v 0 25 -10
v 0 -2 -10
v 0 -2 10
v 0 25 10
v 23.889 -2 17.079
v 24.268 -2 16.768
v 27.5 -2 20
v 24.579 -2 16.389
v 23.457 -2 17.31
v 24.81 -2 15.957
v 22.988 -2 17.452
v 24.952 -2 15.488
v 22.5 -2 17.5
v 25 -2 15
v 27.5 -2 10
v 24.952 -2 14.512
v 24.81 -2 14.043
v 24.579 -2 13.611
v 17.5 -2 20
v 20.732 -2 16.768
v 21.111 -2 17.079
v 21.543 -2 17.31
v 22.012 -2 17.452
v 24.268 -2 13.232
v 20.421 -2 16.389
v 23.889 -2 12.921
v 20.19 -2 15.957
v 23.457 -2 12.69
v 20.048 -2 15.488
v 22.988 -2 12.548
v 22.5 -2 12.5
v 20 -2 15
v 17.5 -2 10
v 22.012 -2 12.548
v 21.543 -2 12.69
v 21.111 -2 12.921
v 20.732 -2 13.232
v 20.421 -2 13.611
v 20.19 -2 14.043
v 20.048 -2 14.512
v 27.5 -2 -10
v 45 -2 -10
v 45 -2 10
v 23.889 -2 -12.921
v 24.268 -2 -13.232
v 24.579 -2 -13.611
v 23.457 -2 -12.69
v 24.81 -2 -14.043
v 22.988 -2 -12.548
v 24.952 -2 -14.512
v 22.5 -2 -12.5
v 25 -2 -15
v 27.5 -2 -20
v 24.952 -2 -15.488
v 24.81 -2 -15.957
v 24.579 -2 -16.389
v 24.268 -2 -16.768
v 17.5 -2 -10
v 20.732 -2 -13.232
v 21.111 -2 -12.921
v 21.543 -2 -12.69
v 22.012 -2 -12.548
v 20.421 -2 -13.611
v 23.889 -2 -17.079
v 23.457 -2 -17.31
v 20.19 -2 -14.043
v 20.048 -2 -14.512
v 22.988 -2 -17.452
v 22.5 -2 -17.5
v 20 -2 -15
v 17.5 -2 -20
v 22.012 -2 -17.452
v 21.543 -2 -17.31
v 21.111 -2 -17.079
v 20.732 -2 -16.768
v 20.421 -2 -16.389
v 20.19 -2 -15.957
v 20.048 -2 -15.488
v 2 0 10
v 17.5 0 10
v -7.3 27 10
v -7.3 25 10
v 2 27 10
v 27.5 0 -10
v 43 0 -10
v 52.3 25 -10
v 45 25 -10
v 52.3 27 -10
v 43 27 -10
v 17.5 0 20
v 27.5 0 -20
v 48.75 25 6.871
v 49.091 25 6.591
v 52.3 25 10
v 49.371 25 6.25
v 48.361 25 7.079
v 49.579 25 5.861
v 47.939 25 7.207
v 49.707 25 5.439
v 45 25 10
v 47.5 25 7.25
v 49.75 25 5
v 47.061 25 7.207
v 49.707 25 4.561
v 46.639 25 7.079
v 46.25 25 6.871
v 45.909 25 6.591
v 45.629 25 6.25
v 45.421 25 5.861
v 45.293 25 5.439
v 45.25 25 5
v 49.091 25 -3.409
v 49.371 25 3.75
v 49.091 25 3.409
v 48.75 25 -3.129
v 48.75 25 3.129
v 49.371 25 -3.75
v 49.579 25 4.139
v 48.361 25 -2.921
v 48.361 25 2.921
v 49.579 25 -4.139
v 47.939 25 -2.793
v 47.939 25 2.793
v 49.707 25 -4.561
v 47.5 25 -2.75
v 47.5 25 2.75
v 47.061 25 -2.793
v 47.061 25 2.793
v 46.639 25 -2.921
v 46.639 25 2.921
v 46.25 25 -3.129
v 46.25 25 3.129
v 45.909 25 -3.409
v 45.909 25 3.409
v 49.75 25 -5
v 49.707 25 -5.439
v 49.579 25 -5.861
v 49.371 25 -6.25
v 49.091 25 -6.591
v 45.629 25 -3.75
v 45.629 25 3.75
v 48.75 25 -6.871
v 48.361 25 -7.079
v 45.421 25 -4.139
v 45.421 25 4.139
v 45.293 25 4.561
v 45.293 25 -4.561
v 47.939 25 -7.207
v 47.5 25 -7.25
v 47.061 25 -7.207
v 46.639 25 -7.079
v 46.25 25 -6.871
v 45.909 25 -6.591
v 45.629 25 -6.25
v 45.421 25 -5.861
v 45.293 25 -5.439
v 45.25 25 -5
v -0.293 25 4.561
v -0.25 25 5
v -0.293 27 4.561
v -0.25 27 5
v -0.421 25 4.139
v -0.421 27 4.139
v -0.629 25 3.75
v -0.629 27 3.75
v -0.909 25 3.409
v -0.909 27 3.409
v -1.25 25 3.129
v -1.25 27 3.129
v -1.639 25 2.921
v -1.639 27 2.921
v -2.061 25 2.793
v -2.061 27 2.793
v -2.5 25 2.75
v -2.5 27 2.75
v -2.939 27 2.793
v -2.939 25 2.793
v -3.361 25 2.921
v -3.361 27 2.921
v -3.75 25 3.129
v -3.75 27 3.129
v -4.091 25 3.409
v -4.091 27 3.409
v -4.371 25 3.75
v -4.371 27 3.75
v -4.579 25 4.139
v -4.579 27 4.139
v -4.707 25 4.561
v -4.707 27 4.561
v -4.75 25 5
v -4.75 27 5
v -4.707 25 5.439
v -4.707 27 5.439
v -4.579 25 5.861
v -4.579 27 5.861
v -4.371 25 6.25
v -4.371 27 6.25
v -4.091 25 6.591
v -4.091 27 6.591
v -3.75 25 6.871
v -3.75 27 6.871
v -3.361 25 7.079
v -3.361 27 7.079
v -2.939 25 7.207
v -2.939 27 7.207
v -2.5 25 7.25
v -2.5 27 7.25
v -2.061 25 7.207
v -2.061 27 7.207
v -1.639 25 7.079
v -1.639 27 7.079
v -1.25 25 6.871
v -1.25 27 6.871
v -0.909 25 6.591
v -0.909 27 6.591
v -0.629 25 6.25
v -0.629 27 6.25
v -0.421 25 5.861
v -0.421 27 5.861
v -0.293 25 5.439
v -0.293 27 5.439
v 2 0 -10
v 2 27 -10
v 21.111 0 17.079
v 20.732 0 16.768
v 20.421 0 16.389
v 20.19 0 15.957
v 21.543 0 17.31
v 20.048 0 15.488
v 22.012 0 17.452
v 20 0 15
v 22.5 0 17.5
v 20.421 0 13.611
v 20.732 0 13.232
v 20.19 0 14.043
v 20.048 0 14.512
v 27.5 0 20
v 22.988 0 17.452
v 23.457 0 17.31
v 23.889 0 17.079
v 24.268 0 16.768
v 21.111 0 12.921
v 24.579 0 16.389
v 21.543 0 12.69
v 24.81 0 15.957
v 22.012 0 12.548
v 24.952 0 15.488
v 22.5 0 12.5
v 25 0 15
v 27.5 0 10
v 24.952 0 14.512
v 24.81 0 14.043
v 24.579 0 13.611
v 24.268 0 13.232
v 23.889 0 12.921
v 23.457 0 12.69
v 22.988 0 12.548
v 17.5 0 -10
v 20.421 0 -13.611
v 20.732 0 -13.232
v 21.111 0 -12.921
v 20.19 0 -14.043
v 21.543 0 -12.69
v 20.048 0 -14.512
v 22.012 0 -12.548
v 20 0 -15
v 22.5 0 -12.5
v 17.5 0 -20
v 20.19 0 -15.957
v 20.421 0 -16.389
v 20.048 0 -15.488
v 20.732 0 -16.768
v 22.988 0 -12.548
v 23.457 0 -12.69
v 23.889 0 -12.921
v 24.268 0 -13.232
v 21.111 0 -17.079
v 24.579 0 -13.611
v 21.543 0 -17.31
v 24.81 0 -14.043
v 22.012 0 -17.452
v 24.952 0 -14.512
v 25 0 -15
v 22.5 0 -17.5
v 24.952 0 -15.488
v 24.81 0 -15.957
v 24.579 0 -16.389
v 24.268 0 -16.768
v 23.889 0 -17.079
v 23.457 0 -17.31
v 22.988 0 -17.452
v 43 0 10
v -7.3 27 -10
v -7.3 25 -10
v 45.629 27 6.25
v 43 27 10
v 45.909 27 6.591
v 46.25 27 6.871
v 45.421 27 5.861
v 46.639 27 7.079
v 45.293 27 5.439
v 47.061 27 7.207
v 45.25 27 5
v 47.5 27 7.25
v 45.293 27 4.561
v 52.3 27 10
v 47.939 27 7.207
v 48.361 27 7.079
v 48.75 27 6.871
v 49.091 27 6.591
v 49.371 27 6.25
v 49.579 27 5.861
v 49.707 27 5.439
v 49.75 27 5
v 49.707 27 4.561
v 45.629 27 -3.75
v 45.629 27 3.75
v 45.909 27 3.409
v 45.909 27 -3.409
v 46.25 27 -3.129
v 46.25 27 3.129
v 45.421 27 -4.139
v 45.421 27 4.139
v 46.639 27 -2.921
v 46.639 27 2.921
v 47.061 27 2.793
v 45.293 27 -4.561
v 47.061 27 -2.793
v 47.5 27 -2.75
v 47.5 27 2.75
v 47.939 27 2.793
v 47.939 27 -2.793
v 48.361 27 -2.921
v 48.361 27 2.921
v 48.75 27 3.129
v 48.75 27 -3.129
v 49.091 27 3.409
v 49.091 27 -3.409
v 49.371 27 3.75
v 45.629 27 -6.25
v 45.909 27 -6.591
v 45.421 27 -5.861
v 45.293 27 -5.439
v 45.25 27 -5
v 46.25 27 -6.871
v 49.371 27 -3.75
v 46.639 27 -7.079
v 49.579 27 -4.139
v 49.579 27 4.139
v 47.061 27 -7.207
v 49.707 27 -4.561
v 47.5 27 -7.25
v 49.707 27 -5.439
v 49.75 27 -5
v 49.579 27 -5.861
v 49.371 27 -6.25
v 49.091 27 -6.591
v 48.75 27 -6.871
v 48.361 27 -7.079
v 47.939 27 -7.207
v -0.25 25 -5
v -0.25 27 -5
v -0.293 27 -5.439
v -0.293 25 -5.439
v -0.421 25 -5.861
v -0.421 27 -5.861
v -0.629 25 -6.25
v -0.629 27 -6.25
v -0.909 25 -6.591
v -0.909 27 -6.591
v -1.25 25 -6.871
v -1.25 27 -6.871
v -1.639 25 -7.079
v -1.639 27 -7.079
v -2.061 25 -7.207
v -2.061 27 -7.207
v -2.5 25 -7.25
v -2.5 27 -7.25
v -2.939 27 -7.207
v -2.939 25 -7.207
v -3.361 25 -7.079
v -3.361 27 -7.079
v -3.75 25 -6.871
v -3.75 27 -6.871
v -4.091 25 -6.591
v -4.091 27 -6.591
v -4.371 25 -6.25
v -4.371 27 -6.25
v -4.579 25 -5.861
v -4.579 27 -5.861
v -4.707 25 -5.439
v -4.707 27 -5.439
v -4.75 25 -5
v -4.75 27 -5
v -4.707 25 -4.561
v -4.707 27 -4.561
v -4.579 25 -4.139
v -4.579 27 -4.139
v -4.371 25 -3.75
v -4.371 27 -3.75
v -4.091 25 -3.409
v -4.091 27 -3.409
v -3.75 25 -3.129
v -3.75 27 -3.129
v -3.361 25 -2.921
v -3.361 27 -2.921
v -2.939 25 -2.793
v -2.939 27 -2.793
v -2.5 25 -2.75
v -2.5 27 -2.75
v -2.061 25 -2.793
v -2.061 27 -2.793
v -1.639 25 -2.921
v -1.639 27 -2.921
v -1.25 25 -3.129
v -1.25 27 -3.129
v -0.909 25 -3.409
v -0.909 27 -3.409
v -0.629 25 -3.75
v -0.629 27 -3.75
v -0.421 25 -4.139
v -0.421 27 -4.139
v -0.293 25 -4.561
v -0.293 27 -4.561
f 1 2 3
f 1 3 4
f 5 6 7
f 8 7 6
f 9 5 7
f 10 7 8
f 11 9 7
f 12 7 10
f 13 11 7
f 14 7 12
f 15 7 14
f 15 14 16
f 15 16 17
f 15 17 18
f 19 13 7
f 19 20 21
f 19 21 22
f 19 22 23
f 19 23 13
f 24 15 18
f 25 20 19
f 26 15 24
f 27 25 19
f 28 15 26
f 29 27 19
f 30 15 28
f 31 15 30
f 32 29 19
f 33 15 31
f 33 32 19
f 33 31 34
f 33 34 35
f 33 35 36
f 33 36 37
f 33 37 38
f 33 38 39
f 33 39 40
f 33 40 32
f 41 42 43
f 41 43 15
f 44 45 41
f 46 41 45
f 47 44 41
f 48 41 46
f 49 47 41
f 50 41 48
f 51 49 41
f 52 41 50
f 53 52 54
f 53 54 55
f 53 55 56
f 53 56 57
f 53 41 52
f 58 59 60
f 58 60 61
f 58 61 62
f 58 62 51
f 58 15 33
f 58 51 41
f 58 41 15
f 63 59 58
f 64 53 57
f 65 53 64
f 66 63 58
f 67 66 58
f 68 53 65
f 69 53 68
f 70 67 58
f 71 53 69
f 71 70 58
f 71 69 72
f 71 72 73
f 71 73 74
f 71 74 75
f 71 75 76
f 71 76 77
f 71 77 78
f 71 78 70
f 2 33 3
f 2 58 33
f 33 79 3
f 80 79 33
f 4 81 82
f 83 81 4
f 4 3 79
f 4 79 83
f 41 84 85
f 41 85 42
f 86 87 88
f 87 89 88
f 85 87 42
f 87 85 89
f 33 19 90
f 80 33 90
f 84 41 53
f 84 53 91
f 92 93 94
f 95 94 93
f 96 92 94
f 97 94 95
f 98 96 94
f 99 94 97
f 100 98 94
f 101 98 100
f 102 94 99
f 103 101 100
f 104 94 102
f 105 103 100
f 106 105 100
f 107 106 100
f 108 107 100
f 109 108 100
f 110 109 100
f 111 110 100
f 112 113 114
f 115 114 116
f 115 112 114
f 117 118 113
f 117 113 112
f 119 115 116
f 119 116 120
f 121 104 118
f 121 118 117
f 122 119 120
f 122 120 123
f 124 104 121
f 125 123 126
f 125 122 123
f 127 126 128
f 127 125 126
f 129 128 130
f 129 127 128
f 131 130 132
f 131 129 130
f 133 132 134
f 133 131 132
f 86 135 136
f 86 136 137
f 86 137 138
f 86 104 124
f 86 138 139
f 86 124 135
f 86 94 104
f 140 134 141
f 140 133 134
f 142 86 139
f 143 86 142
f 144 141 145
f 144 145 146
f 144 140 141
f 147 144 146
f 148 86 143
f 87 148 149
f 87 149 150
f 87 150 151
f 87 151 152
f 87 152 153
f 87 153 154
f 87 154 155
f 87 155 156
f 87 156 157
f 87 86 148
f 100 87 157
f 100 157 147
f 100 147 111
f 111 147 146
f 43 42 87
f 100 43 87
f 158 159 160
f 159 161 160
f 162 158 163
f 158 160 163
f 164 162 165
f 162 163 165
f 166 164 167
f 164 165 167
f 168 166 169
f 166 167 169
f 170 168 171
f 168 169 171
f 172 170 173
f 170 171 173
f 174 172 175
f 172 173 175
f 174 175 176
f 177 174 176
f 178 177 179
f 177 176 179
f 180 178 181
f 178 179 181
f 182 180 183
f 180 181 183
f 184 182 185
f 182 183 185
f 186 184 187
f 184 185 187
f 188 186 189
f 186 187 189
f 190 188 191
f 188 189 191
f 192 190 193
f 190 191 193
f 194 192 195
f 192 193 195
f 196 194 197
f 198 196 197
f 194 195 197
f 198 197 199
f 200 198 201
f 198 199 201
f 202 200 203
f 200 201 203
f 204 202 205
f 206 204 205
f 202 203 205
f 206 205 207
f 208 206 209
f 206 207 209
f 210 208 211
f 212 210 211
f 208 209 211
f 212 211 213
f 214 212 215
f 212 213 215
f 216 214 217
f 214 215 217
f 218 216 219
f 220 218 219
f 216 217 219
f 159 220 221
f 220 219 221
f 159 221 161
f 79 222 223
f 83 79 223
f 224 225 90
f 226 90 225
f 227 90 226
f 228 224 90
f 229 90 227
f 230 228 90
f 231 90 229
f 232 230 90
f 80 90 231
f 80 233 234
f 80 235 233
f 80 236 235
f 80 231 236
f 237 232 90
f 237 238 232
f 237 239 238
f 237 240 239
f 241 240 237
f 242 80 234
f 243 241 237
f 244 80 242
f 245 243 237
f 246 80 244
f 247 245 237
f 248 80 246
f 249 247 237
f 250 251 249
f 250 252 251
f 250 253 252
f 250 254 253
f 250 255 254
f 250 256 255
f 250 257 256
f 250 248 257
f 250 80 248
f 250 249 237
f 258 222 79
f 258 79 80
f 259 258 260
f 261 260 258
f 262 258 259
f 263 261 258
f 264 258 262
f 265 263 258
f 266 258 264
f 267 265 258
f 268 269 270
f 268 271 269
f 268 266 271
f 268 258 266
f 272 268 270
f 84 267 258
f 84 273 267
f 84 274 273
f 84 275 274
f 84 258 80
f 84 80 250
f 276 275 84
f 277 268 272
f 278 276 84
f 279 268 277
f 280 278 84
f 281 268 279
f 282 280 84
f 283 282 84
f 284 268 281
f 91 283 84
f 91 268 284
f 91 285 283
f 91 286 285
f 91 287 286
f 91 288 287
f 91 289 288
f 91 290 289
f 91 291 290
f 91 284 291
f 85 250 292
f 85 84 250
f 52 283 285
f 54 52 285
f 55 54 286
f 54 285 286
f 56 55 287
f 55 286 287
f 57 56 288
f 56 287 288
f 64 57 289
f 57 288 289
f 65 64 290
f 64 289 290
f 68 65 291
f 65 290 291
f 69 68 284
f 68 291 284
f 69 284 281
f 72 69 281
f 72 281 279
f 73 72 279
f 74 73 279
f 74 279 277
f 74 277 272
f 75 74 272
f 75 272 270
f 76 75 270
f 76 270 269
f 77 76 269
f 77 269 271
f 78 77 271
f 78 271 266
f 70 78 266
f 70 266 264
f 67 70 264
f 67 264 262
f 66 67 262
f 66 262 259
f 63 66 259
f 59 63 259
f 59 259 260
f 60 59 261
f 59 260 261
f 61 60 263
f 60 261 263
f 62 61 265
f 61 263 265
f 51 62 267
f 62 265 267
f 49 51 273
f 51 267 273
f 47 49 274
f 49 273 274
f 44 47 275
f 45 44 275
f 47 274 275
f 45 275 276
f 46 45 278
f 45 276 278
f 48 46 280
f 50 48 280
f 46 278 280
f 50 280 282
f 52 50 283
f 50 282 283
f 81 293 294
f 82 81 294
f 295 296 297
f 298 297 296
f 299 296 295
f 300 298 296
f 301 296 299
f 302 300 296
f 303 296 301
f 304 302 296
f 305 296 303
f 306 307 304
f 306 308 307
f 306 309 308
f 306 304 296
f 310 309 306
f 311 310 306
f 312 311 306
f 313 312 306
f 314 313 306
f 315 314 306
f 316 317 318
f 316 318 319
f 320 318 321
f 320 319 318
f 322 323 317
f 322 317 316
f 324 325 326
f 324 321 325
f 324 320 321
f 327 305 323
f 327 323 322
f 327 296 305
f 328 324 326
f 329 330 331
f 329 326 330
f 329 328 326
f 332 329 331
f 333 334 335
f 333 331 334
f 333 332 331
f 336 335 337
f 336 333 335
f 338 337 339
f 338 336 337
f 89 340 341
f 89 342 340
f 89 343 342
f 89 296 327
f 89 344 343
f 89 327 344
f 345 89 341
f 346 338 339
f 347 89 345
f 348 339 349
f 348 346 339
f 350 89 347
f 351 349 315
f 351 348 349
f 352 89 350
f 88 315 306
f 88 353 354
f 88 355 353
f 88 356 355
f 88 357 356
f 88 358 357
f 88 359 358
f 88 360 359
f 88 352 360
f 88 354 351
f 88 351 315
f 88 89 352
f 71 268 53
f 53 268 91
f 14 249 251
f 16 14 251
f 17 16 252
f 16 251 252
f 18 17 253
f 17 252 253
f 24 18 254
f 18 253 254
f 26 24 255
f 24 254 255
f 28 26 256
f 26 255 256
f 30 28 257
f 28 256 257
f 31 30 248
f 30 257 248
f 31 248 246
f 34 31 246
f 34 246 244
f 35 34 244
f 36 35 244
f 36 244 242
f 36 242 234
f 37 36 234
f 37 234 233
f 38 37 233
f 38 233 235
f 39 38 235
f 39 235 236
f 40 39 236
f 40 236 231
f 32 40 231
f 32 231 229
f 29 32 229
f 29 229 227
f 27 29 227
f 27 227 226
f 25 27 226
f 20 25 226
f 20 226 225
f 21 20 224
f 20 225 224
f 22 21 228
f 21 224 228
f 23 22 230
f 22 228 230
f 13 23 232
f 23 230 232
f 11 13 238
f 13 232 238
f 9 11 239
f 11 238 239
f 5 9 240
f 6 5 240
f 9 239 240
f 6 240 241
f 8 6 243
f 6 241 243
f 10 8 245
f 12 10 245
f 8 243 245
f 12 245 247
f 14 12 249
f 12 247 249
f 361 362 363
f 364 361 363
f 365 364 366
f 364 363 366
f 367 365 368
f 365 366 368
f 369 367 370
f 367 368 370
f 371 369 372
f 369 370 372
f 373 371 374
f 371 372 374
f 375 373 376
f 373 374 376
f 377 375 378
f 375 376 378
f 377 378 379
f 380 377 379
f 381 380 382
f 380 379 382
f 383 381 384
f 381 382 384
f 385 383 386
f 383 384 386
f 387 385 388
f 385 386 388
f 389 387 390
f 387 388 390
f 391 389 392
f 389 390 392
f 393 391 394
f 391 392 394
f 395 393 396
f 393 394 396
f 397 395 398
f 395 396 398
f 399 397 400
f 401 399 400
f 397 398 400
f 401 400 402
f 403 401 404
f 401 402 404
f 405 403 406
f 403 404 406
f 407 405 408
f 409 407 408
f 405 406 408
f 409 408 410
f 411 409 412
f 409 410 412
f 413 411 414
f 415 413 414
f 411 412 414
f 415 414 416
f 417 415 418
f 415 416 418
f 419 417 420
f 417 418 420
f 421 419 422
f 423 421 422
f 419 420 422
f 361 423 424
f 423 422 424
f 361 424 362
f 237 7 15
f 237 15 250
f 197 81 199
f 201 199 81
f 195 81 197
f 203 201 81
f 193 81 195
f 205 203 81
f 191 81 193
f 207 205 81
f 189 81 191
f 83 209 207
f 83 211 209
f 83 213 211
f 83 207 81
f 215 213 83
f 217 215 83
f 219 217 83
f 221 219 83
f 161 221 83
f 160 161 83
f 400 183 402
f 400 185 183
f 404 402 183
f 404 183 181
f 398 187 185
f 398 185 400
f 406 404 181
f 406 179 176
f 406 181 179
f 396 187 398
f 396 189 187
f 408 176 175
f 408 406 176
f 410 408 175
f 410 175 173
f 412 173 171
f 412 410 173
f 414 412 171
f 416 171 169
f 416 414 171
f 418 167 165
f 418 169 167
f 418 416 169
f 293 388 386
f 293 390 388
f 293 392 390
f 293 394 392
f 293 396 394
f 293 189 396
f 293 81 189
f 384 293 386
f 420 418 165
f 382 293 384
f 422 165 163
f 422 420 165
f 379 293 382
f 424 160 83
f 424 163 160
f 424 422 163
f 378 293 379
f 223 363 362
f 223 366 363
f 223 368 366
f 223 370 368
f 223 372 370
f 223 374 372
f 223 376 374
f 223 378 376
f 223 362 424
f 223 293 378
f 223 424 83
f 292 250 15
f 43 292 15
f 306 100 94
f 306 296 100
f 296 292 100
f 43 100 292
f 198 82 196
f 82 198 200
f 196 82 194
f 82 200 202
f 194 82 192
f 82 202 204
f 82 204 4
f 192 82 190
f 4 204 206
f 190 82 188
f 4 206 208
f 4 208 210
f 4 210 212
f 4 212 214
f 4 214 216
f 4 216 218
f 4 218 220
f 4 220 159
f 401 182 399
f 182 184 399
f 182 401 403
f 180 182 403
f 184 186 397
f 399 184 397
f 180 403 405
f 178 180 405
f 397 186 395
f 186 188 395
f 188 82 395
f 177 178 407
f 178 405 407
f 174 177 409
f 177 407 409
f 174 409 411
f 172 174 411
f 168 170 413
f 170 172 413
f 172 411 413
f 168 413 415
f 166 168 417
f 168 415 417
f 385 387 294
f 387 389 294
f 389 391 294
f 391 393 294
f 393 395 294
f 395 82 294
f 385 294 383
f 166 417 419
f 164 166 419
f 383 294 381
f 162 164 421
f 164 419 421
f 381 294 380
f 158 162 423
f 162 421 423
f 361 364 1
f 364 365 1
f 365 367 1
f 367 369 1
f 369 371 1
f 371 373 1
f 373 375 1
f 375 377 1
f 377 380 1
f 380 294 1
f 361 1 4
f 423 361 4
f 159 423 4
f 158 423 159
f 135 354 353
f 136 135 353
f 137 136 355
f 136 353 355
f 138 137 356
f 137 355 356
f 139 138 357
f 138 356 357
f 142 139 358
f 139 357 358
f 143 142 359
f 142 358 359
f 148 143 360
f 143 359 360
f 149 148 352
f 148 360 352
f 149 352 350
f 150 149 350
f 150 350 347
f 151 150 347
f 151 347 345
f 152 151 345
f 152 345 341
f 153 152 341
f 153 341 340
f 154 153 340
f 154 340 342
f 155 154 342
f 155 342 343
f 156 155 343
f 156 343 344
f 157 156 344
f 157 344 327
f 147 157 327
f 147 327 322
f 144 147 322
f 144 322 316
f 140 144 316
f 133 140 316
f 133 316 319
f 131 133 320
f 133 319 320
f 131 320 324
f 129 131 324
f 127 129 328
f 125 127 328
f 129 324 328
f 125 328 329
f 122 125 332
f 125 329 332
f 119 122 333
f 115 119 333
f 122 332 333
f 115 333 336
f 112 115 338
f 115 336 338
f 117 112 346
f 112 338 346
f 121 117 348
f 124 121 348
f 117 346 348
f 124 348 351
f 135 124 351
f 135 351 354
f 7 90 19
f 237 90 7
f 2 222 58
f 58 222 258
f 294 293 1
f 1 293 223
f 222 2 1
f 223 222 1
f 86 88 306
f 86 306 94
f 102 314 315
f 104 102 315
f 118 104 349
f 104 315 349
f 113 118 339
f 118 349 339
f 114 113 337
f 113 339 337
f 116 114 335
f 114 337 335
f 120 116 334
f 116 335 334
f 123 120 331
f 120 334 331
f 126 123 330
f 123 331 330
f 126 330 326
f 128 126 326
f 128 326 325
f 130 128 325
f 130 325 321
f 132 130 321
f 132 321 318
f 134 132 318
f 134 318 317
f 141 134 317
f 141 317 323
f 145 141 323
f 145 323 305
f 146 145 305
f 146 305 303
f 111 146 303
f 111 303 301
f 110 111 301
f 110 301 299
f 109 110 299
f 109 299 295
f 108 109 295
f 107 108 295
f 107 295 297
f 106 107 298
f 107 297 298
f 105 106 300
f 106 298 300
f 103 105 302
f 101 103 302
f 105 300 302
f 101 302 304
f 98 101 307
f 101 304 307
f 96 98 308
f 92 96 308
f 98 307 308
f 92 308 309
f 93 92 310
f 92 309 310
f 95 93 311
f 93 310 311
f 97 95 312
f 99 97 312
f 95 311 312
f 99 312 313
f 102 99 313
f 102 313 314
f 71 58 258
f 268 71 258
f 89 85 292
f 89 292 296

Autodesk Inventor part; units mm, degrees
ref_plane "YZ Plane" through (0, 0, 0) normal (1, 0, 0) x (0, 1, 0)
ref_plane "XZ Plane" through (0, 0, 0) normal (0, 1, 0) x (-1, 0, 0)
ref_plane "XY Plane" through (0, 0, 0) normal (0, 0, 1) x (1, 0, 0)
sketch "Sketch1" plane through (0, 0, 0) normal (0, 0, 1) x (1, 0, 0)
  line L0 (2, 0) -> (43, 0)
  line L1 (45, 0) -> (45, -2)
  line L2 (45, -2) -> (0, -2)
  line L3 (0, -2) -> (0, 0)
  line L4 (45, 0) -> (45, 25)
  line L5 (52.3, 27) -> (52.3, 25)
  line L6 (52.3, 25) -> (45, 25)
  line L7 (22.5, -2) -> (22.5, 38) construction
  line L8 (0, 0) -> (0, 25)
  line L9 (-7.3, 27) -> (-7.3, 25)
  line L10 (-7.3, 25) -> (0, 25)
  line L11 (2, 0) -> (2, 27)
  line L12 (43, 0) -> (43, 27)
  line L13 (43, 27) -> (52.3, 27)
  line L14 (-7.3, 27) -> (2, 27)
  line L15 (17.5, -2) -> (17.5, 0)
  line L16 (27.5, -2) -> (27.5, 0)
  point P0 (27.5, -2)
  point P1 (17.5, -2)
  dimension "d0" = 45
  dimension "d4" = 2
  dimension "d5" = 40
  dimension "d8" = 2
  dimension "d9" = 27
  dimension "d11" = 9.3
  dimension "d20" = 2
  dimension "d29" = 5
  dimension "d30" = 10
extrude "Extrusion1" add sketch "Sketch1" along normal mid plane 20 contours L0 L15 L2 L3 L8 L10 L9 L14 L11 | L0 L12 L13 L5 L6 L4 L1 L2 L16
sketch "Sketch3" plane through (-7.3, 27, -10) normal (0, 1, 0) x (1, 0, 0)
  circle A0 centre (4.8, -5) radius 2.25
  line L0 (9.3, 0) -> (9.3, -20) projected
  line L1 (0, 0) -> (9.3, 0) projected
  circle A1 centre (4.8, -15) radius 2.25
  line L2 (7.3, -20) -> (52.3, -20) construction
  line L3 (29.8, -20) -> (29.8, 0) construction
  circle A2 centre (54.8, -5) radius 2.25
  circle A3 centre (54.8, -15) radius 2.25
  dimension "d21" = 4.5
  dimension "d22" = 4.5
  dimension "d23" = 5
  dimension "d24" = 4.5
  dimension "d25" = 10
  dimension "d26" = 4.5
extrude "Extrusion2" cut sketch "Sketch3" against normal through all
extrude "Extrusion3" add sketch "Sketch1" along normal mid plane 40 contours L0 L16 L2 L15
sketch "Sketch4" plane through (2, 0, 10) normal (0, 1, 0) x (1, 0, 0)
  circle A0 centre (20.5, -5) radius 2.5
  circle A1 centre (20.5, 25) radius 2.5
  line L0 (15.5, 30) -> (25.5, 30) projected
  line L1 (25.5, 20) -> (25.5, 30) projected
  line L2 (25.5, -10) -> (25.5, 0) projected
  line L3 (25.5, -10) -> (15.5, -10) projected
  point P0 (-2, 10)
  dimension "d33" = 5
  dimension "d34" = 5
  dimension "d35" = 5
  dimension "d36" = 5
  dimension "d37" = 5
extrude "Extrusion4" cut sketch "Sketch4" against normal blind 5
thread "Thread1" size "M5x0.8" class "6H" standard "ANSI Metric M Profile" length 77
thread "Thread2" size "M4.5x0.75" class "6H" standard "ANSI Metric M Profile" length 77
thread "Thread3" size "M4.5x0.75" class "6H" standard "ANSI Metric M Profile" length 77
thread "Thread4" size "M4.5x0.75" class "6H" standard "ANSI Metric M Profile" length 77
thread "Thread5" size "M4.5x0.75" class "6H" standard "ANSI Metric M Profile" length 77
thread "Thread6" size "M5x0.8" class "6H" standard "ANSI Metric M Profile" length 77
equation "\"d11\" = d10"
equation "\"d26\" = d22"
equation "\"d36\" = d34"
equation "\"d37\" = d33"
equation "\"d38\" = d37"
equation "\"d10\" = 9.3"
properties part number "Servo Mount"
